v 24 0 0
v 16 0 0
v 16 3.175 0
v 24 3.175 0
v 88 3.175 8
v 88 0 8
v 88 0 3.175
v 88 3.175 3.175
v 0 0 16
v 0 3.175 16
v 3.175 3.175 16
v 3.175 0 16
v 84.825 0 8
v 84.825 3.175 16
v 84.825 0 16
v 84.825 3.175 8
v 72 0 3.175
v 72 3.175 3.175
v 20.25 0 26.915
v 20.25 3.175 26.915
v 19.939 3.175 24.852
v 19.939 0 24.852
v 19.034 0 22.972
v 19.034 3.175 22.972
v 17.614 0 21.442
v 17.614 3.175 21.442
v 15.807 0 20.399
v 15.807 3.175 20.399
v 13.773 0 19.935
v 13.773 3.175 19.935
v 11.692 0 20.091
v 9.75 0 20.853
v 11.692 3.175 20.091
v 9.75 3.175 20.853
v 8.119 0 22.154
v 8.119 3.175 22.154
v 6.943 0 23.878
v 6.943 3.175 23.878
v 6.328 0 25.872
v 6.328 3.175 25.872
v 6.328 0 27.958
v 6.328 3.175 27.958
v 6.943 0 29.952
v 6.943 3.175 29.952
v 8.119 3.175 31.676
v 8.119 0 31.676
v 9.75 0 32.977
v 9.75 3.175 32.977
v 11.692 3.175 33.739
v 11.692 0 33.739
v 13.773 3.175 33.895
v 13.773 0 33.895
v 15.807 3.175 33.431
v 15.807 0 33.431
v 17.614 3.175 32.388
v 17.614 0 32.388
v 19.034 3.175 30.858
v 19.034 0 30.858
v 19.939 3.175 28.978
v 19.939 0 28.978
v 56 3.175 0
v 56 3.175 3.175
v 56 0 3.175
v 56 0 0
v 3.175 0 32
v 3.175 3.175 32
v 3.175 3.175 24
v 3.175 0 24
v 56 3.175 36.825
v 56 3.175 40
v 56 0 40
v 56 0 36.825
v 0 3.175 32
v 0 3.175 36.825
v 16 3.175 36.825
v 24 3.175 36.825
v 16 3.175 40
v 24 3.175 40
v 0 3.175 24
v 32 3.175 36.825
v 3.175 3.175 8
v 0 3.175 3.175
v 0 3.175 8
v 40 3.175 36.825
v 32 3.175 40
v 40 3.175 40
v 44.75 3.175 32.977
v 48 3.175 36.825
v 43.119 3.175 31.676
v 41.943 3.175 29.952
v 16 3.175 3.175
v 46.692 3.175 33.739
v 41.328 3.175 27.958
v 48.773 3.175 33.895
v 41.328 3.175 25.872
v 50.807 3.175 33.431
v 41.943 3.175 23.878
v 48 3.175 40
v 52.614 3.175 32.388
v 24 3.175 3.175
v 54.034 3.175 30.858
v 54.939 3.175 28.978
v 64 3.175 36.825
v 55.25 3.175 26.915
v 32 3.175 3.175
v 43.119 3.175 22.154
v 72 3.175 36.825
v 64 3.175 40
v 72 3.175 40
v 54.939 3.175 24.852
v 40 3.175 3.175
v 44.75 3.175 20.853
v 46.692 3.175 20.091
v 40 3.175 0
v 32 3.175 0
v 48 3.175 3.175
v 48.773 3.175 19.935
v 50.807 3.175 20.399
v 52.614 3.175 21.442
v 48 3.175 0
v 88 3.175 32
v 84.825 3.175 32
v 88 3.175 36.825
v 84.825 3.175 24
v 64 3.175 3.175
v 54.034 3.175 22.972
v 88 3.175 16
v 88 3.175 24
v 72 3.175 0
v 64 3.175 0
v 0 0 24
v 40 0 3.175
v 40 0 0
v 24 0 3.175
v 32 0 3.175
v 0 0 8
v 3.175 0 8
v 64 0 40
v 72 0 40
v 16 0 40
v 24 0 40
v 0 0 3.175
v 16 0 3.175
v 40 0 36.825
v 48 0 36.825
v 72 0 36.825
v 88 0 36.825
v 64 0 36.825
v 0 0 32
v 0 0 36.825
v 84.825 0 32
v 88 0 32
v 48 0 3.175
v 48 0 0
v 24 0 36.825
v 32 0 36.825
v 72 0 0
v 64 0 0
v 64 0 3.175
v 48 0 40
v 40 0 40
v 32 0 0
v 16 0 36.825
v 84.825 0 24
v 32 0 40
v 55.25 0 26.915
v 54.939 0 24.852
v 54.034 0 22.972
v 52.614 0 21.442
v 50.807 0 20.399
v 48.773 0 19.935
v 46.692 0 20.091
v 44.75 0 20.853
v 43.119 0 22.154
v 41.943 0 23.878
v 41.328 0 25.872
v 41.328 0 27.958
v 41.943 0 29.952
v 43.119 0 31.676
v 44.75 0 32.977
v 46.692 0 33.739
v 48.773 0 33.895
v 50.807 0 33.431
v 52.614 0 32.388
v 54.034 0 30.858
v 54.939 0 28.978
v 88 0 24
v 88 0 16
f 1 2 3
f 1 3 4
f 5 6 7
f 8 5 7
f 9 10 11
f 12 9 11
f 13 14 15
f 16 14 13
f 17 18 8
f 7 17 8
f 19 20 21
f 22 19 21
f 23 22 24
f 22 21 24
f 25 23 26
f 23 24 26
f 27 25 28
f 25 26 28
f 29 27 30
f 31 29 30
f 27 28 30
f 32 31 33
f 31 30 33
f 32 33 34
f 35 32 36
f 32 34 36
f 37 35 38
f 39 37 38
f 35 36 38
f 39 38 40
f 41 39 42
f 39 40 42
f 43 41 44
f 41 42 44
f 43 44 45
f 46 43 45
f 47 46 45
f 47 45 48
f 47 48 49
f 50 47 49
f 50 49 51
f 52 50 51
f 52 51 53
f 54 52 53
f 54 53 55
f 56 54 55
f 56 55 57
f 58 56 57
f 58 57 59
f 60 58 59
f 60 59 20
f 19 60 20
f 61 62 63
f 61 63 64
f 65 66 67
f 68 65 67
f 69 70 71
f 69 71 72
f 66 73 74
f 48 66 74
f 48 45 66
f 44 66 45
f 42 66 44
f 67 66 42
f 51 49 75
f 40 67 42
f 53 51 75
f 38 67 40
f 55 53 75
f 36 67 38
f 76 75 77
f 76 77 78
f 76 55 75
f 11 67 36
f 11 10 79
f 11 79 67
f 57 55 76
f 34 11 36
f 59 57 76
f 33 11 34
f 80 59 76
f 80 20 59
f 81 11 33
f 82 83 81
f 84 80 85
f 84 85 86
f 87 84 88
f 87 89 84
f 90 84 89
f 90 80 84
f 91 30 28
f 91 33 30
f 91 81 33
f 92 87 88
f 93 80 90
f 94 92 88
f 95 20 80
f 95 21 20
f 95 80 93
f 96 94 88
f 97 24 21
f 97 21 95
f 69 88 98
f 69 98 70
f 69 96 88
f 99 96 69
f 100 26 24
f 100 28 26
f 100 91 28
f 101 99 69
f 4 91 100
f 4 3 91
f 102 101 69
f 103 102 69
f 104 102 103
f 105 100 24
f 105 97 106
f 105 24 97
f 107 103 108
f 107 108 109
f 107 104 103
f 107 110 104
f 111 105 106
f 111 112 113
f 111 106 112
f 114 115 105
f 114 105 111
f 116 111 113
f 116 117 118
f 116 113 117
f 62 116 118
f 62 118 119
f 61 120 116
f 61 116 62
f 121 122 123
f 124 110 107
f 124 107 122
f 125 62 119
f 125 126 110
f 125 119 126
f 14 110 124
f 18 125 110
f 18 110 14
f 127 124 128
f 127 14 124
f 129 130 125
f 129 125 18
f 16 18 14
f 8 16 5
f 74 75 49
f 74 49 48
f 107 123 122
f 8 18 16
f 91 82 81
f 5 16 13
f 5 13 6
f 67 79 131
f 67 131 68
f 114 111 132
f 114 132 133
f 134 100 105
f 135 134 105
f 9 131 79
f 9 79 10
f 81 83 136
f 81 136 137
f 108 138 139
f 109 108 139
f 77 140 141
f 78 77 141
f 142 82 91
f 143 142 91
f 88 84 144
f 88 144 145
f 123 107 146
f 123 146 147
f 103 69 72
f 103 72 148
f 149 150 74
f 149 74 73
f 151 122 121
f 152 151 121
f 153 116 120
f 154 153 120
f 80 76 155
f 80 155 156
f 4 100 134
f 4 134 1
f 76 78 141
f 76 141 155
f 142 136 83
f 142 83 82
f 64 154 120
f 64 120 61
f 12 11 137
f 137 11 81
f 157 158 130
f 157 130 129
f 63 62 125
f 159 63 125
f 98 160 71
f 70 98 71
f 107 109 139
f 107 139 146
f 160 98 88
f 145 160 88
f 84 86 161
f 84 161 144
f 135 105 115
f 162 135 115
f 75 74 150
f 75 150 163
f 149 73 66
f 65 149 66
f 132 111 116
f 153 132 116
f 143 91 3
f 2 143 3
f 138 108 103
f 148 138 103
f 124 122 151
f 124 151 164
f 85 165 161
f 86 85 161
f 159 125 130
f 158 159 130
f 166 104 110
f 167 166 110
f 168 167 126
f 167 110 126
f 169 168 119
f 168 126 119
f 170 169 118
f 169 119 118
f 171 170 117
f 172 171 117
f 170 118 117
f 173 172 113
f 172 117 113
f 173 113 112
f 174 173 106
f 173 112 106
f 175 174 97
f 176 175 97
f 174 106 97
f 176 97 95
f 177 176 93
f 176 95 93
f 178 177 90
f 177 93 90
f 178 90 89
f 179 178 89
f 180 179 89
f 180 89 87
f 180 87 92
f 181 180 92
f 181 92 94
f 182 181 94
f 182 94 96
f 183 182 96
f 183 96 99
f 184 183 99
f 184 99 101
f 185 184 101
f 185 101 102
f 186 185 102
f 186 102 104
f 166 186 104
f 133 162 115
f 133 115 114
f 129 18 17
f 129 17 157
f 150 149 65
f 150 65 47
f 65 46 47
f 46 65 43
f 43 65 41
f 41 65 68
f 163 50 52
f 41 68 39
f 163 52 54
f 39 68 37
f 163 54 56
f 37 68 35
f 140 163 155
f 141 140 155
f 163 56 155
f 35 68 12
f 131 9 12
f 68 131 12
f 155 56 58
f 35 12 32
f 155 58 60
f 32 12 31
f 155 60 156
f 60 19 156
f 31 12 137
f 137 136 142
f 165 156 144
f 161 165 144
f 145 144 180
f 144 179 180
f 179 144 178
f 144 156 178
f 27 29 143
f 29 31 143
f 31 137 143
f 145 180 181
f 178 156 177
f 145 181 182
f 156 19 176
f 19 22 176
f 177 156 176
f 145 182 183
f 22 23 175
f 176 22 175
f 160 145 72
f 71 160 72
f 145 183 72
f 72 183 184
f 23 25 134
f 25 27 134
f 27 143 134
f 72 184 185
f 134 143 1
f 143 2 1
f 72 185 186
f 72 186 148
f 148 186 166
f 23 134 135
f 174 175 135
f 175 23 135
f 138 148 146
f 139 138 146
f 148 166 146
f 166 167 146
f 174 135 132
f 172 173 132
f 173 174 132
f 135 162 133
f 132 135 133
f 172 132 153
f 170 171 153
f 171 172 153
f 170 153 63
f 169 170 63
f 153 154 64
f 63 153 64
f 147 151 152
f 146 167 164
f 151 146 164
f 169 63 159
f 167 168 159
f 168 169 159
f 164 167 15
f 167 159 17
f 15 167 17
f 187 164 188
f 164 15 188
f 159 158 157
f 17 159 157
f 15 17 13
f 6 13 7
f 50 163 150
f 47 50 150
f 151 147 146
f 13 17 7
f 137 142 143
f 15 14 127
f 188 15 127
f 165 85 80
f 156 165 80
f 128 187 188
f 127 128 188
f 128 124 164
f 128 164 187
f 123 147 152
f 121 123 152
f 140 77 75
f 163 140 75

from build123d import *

# Parameters (mm, degrees)
SKETCH1_W           = 88
SKETCH1_H           = 40
BOSS_EXTRUDE1_DEPTH = 3.175
CUT_EXTRUDE1_REACH  = 5.175
SKETCH2_W           = 16
SKETCH2_H           = 3.175
SKETCH2_W_2         = 8
CUT_EXTRUDE2_REACH  = 5.175
SKETCH3_W           = 3.175
SKETCH3_H           = 8
CUT_EXTRUDE3_REACH  = 5.175
SKETCH4_R           = 7


with BuildPart() as part:
    # Sketch1 → Boss-Extrude1 (new body)
    with BuildSketch(Plane(origin=(0, 0, 0), x_dir=(1, 0, 0), z_dir=(0, 1, 0))):
        with Locations((44, -20)):
            Rectangle(SKETCH1_W, SKETCH1_H)
    extrude(amount=BOSS_EXTRUDE1_DEPTH)

    # Sketch2 → Cut-Extrude1 (cut, up to next)
    with BuildSketch(Plane(origin=(0, 3.175, 0), x_dir=(1, 0, 0), z_dir=(0, 1, 0)), mode=Mode.PRIVATE) as cut_extrude1_sk1:
        with Locations((8, -1.5875)):
            Rectangle(SKETCH2_W, SKETCH2_H)
    cut_extrude1_tool1 = extrude(cut_extrude1_sk1.sketch, amount=-CUT_EXTRUDE1_REACH, mode=Mode.PRIVATE) & part.part
    add(cut_extrude1_tool1.solids().sort_by_distance((8, 3.175, 1.5875))[0], mode=Mode.SUBTRACT)
    # Sketch2 → Cut-Extrude1 (cut, up to next)
    with BuildSketch(Plane(origin=(0, 3.175, 0), x_dir=(1, 0, 0), z_dir=(0, 1, 0)), mode=Mode.PRIVATE) as cut_extrude1_sk2:
        with Locations((44, -1.5875)):
            Rectangle(SKETCH2_W_2, SKETCH2_H)
    cut_extrude1_tool2 = extrude(cut_extrude1_sk2.sketch, amount=-CUT_EXTRUDE1_REACH, mode=Mode.PRIVATE) & part.part
    add(cut_extrude1_tool2.solids().sort_by_distance((44, 3.175, 1.5875))[0], mode=Mode.SUBTRACT)
    # Sketch2 → Cut-Extrude1 (cut, up to next)
    with BuildSketch(Plane(origin=(0, 3.175, 0), x_dir=(1, 0, 0), z_dir=(0, 1, 0)), mode=Mode.PRIVATE) as cut_extrude1_sk3:
        with Locations((60, -1.5875)):
            Rectangle(SKETCH2_W_2, SKETCH2_H)
    cut_extrude1_tool3 = extrude(cut_extrude1_sk3.sketch, amount=-CUT_EXTRUDE1_REACH, mode=Mode.PRIVATE) & part.part
    add(cut_extrude1_tool3.solids().sort_by_distance((60, 3.175, 1.5875))[0], mode=Mode.SUBTRACT)
    # Sketch2 → Cut-Extrude1 (cut, up to next)
    with BuildSketch(Plane(origin=(0, 3.175, 0), x_dir=(1, 0, 0), z_dir=(0, 1, 0)), mode=Mode.PRIVATE) as cut_extrude1_sk4:
        with Locations((80, -1.5875)):
            Rectangle(SKETCH2_W, SKETCH2_H)
    cut_extrude1_tool4 = extrude(cut_extrude1_sk4.sketch, amount=-CUT_EXTRUDE1_REACH, mode=Mode.PRIVATE) & part.part
    add(cut_extrude1_tool4.solids().sort_by_distance((80, 3.175, 1.5875))[0], mode=Mode.SUBTRACT)
    # Sketch2 → Cut-Extrude1 (cut, up to next)
    with BuildSketch(Plane(origin=(0, 3.175, 0), x_dir=(1, 0, 0), z_dir=(0, 1, 0)), mode=Mode.PRIVATE) as cut_extrude1_sk5:
        with Locations((28, -1.5875)):
            Rectangle(SKETCH2_W_2, SKETCH2_H)
    cut_extrude1_tool5 = extrude(cut_extrude1_sk5.sketch, amount=-CUT_EXTRUDE1_REACH, mode=Mode.PRIVATE) & part.part
    add(cut_extrude1_tool5.solids().sort_by_distance((28, 3.175, 1.5875))[0], mode=Mode.SUBTRACT)
    # Sketch2 → Cut-Extrude1 (cut, up to next)
    with BuildSketch(Plane(origin=(0, 3.175, 0), x_dir=(1, 0, 0), z_dir=(0, 1, 0)), mode=Mode.PRIVATE) as cut_extrude1_sk6:
        with Locations((44, -38.4125)):
            Rectangle(SKETCH2_W_2, SKETCH2_H)
    cut_extrude1_tool6 = extrude(cut_extrude1_sk6.sketch, amount=-CUT_EXTRUDE1_REACH, mode=Mode.PRIVATE) & part.part
    add(cut_extrude1_tool6.solids().sort_by_distance((44, 3.175, 38.4125))[0], mode=Mode.SUBTRACT)
    # Sketch2 → Cut-Extrude1 (cut, up to next)
    with BuildSketch(Plane(origin=(0, 3.175, 0), x_dir=(1, 0, 0), z_dir=(0, 1, 0)), mode=Mode.PRIVATE) as cut_extrude1_sk7:
        with Locations((28, -38.4125)):
            Rectangle(SKETCH2_W_2, SKETCH2_H)
    cut_extrude1_tool7 = extrude(cut_extrude1_sk7.sketch, amount=-CUT_EXTRUDE1_REACH, mode=Mode.PRIVATE) & part.part
    add(cut_extrude1_tool7.solids().sort_by_distance((28, 3.175, 38.4125))[0], mode=Mode.SUBTRACT)
    # Sketch2 → Cut-Extrude1 (cut, up to next)
    with BuildSketch(Plane(origin=(0, 3.175, 0), x_dir=(1, 0, 0), z_dir=(0, 1, 0)), mode=Mode.PRIVATE) as cut_extrude1_sk8:
        with Locations((8, -38.4125)):
            Rectangle(SKETCH2_W, SKETCH2_H)
    cut_extrude1_tool8 = extrude(cut_extrude1_sk8.sketch, amount=-CUT_EXTRUDE1_REACH, mode=Mode.PRIVATE) & part.part
    add(cut_extrude1_tool8.solids().sort_by_distance((8, 3.175, 38.4125))[0], mode=Mode.SUBTRACT)
    # Sketch2 → Cut-Extrude1 (cut, up to next)
    with BuildSketch(Plane(origin=(0, 3.175, 0), x_dir=(1, 0, 0), z_dir=(0, 1, 0)), mode=Mode.PRIVATE) as cut_extrude1_sk9:
        with Locations((80, -38.4125)):
            Rectangle(SKETCH2_W, SKETCH2_H)
    cut_extrude1_tool9 = extrude(cut_extrude1_sk9.sketch, amount=-CUT_EXTRUDE1_REACH, mode=Mode.PRIVATE) & part.part
    add(cut_extrude1_tool9.solids().sort_by_distance((80, 3.175, 38.4125))[0], mode=Mode.SUBTRACT)
    # Sketch2 → Cut-Extrude1 (cut, up to next)
    with BuildSketch(Plane(origin=(0, 3.175, 0), x_dir=(1, 0, 0), z_dir=(0, 1, 0)), mode=Mode.PRIVATE) as cut_extrude1_sk10:
        with Locations((60, -38.4125)):
            Rectangle(SKETCH2_W_2, SKETCH2_H)
    cut_extrude1_tool10 = extrude(cut_extrude1_sk10.sketch, amount=-CUT_EXTRUDE1_REACH, mode=Mode.PRIVATE) & part.part
    add(cut_extrude1_tool10.solids().sort_by_distance((60, 3.175, 38.4125))[0], mode=Mode.SUBTRACT)

    # Sketch3 → Cut-Extrude2 (cut, up to next)
    with BuildSketch(Plane(origin=(0, 3.175, 0), x_dir=(1, 0, 0), z_dir=(0, 1, 0)), mode=Mode.PRIVATE) as cut_extrude2_sk1:
        with Locations((1.5875, -28)):
            Rectangle(SKETCH3_W, SKETCH3_H)
    cut_extrude2_tool1 = extrude(cut_extrude2_sk1.sketch, amount=-CUT_EXTRUDE2_REACH, mode=Mode.PRIVATE) & part.part
    add(cut_extrude2_tool1.solids().sort_by_distance((1.5875, 3.175, 28))[0], mode=Mode.SUBTRACT)
    # Sketch3 → Cut-Extrude2 (cut, up to next)
    with BuildSketch(Plane(origin=(0, 3.175, 0), x_dir=(1, 0, 0), z_dir=(0, 1, 0)), mode=Mode.PRIVATE) as cut_extrude2_sk2:
        with Locations((1.5875, -12)):
            Rectangle(SKETCH3_W, SKETCH3_H)
    cut_extrude2_tool2 = extrude(cut_extrude2_sk2.sketch, amount=-CUT_EXTRUDE2_REACH, mode=Mode.PRIVATE) & part.part
    add(cut_extrude2_tool2.solids().sort_by_distance((1.5875, 3.175, 12))[0], mode=Mode.SUBTRACT)
    # Sketch3 → Cut-Extrude2 (cut, up to next)
    with BuildSketch(Plane(origin=(0, 3.175, 0), x_dir=(1, 0, 0), z_dir=(0, 1, 0)), mode=Mode.PRIVATE) as cut_extrude2_sk3:
        with Locations((86.4125, -28)):
            Rectangle(SKETCH3_W, SKETCH3_H)
    cut_extrude2_tool3 = extrude(cut_extrude2_sk3.sketch, amount=-CUT_EXTRUDE2_REACH, mode=Mode.PRIVATE) & part.part
    add(cut_extrude2_tool3.solids().sort_by_distance((86.4125, 3.175, 28))[0], mode=Mode.SUBTRACT)
    # Sketch3 → Cut-Extrude2 (cut, up to next)
    with BuildSketch(Plane(origin=(0, 3.175, 0), x_dir=(1, 0, 0), z_dir=(0, 1, 0)), mode=Mode.PRIVATE) as cut_extrude2_sk4:
        with Locations((86.4125, -12)):
            Rectangle(SKETCH3_W, SKETCH3_H)
    cut_extrude2_tool4 = extrude(cut_extrude2_sk4.sketch, amount=-CUT_EXTRUDE2_REACH, mode=Mode.PRIVATE) & part.part
    add(cut_extrude2_tool4.solids().sort_by_distance((86.4125, 3.175, 12))[0], mode=Mode.SUBTRACT)

    # Sketch4 → Cut-Extrude3 (cut, up to next)
    with BuildSketch(Plane(origin=(0, 3.175, 0), x_dir=(1, 0, 0), z_dir=(0, 1, 0)), mode=Mode.PRIVATE) as cut_extrude3_sk1:
        with Locations((13.25, -26.915)):
            Circle(SKETCH4_R)
    cut_extrude3_tool1 = extrude(cut_extrude3_sk1.sketch, amount=-CUT_EXTRUDE3_REACH, mode=Mode.PRIVATE) & part.part
    add(cut_extrude3_tool1.solids().sort_by_distance((13.25, 3.175, 26.915))[0], mode=Mode.SUBTRACT)
    # Sketch4 → Cut-Extrude3 (cut, up to next)
    with BuildSketch(Plane(origin=(0, 3.175, 0), x_dir=(1, 0, 0), z_dir=(0, 1, 0)), mode=Mode.PRIVATE) as cut_extrude3_sk2:
        with Locations((48.25, -26.915)):
            Circle(SKETCH4_R)
    cut_extrude3_tool2 = extrude(cut_extrude3_sk2.sketch, amount=-CUT_EXTRUDE3_REACH, mode=Mode.PRIVATE) & part.part
    add(cut_extrude3_tool2.solids().sort_by_distance((48.25, 3.175, 26.915))[0], mode=Mode.SUBTRACT)


solid = part.part
